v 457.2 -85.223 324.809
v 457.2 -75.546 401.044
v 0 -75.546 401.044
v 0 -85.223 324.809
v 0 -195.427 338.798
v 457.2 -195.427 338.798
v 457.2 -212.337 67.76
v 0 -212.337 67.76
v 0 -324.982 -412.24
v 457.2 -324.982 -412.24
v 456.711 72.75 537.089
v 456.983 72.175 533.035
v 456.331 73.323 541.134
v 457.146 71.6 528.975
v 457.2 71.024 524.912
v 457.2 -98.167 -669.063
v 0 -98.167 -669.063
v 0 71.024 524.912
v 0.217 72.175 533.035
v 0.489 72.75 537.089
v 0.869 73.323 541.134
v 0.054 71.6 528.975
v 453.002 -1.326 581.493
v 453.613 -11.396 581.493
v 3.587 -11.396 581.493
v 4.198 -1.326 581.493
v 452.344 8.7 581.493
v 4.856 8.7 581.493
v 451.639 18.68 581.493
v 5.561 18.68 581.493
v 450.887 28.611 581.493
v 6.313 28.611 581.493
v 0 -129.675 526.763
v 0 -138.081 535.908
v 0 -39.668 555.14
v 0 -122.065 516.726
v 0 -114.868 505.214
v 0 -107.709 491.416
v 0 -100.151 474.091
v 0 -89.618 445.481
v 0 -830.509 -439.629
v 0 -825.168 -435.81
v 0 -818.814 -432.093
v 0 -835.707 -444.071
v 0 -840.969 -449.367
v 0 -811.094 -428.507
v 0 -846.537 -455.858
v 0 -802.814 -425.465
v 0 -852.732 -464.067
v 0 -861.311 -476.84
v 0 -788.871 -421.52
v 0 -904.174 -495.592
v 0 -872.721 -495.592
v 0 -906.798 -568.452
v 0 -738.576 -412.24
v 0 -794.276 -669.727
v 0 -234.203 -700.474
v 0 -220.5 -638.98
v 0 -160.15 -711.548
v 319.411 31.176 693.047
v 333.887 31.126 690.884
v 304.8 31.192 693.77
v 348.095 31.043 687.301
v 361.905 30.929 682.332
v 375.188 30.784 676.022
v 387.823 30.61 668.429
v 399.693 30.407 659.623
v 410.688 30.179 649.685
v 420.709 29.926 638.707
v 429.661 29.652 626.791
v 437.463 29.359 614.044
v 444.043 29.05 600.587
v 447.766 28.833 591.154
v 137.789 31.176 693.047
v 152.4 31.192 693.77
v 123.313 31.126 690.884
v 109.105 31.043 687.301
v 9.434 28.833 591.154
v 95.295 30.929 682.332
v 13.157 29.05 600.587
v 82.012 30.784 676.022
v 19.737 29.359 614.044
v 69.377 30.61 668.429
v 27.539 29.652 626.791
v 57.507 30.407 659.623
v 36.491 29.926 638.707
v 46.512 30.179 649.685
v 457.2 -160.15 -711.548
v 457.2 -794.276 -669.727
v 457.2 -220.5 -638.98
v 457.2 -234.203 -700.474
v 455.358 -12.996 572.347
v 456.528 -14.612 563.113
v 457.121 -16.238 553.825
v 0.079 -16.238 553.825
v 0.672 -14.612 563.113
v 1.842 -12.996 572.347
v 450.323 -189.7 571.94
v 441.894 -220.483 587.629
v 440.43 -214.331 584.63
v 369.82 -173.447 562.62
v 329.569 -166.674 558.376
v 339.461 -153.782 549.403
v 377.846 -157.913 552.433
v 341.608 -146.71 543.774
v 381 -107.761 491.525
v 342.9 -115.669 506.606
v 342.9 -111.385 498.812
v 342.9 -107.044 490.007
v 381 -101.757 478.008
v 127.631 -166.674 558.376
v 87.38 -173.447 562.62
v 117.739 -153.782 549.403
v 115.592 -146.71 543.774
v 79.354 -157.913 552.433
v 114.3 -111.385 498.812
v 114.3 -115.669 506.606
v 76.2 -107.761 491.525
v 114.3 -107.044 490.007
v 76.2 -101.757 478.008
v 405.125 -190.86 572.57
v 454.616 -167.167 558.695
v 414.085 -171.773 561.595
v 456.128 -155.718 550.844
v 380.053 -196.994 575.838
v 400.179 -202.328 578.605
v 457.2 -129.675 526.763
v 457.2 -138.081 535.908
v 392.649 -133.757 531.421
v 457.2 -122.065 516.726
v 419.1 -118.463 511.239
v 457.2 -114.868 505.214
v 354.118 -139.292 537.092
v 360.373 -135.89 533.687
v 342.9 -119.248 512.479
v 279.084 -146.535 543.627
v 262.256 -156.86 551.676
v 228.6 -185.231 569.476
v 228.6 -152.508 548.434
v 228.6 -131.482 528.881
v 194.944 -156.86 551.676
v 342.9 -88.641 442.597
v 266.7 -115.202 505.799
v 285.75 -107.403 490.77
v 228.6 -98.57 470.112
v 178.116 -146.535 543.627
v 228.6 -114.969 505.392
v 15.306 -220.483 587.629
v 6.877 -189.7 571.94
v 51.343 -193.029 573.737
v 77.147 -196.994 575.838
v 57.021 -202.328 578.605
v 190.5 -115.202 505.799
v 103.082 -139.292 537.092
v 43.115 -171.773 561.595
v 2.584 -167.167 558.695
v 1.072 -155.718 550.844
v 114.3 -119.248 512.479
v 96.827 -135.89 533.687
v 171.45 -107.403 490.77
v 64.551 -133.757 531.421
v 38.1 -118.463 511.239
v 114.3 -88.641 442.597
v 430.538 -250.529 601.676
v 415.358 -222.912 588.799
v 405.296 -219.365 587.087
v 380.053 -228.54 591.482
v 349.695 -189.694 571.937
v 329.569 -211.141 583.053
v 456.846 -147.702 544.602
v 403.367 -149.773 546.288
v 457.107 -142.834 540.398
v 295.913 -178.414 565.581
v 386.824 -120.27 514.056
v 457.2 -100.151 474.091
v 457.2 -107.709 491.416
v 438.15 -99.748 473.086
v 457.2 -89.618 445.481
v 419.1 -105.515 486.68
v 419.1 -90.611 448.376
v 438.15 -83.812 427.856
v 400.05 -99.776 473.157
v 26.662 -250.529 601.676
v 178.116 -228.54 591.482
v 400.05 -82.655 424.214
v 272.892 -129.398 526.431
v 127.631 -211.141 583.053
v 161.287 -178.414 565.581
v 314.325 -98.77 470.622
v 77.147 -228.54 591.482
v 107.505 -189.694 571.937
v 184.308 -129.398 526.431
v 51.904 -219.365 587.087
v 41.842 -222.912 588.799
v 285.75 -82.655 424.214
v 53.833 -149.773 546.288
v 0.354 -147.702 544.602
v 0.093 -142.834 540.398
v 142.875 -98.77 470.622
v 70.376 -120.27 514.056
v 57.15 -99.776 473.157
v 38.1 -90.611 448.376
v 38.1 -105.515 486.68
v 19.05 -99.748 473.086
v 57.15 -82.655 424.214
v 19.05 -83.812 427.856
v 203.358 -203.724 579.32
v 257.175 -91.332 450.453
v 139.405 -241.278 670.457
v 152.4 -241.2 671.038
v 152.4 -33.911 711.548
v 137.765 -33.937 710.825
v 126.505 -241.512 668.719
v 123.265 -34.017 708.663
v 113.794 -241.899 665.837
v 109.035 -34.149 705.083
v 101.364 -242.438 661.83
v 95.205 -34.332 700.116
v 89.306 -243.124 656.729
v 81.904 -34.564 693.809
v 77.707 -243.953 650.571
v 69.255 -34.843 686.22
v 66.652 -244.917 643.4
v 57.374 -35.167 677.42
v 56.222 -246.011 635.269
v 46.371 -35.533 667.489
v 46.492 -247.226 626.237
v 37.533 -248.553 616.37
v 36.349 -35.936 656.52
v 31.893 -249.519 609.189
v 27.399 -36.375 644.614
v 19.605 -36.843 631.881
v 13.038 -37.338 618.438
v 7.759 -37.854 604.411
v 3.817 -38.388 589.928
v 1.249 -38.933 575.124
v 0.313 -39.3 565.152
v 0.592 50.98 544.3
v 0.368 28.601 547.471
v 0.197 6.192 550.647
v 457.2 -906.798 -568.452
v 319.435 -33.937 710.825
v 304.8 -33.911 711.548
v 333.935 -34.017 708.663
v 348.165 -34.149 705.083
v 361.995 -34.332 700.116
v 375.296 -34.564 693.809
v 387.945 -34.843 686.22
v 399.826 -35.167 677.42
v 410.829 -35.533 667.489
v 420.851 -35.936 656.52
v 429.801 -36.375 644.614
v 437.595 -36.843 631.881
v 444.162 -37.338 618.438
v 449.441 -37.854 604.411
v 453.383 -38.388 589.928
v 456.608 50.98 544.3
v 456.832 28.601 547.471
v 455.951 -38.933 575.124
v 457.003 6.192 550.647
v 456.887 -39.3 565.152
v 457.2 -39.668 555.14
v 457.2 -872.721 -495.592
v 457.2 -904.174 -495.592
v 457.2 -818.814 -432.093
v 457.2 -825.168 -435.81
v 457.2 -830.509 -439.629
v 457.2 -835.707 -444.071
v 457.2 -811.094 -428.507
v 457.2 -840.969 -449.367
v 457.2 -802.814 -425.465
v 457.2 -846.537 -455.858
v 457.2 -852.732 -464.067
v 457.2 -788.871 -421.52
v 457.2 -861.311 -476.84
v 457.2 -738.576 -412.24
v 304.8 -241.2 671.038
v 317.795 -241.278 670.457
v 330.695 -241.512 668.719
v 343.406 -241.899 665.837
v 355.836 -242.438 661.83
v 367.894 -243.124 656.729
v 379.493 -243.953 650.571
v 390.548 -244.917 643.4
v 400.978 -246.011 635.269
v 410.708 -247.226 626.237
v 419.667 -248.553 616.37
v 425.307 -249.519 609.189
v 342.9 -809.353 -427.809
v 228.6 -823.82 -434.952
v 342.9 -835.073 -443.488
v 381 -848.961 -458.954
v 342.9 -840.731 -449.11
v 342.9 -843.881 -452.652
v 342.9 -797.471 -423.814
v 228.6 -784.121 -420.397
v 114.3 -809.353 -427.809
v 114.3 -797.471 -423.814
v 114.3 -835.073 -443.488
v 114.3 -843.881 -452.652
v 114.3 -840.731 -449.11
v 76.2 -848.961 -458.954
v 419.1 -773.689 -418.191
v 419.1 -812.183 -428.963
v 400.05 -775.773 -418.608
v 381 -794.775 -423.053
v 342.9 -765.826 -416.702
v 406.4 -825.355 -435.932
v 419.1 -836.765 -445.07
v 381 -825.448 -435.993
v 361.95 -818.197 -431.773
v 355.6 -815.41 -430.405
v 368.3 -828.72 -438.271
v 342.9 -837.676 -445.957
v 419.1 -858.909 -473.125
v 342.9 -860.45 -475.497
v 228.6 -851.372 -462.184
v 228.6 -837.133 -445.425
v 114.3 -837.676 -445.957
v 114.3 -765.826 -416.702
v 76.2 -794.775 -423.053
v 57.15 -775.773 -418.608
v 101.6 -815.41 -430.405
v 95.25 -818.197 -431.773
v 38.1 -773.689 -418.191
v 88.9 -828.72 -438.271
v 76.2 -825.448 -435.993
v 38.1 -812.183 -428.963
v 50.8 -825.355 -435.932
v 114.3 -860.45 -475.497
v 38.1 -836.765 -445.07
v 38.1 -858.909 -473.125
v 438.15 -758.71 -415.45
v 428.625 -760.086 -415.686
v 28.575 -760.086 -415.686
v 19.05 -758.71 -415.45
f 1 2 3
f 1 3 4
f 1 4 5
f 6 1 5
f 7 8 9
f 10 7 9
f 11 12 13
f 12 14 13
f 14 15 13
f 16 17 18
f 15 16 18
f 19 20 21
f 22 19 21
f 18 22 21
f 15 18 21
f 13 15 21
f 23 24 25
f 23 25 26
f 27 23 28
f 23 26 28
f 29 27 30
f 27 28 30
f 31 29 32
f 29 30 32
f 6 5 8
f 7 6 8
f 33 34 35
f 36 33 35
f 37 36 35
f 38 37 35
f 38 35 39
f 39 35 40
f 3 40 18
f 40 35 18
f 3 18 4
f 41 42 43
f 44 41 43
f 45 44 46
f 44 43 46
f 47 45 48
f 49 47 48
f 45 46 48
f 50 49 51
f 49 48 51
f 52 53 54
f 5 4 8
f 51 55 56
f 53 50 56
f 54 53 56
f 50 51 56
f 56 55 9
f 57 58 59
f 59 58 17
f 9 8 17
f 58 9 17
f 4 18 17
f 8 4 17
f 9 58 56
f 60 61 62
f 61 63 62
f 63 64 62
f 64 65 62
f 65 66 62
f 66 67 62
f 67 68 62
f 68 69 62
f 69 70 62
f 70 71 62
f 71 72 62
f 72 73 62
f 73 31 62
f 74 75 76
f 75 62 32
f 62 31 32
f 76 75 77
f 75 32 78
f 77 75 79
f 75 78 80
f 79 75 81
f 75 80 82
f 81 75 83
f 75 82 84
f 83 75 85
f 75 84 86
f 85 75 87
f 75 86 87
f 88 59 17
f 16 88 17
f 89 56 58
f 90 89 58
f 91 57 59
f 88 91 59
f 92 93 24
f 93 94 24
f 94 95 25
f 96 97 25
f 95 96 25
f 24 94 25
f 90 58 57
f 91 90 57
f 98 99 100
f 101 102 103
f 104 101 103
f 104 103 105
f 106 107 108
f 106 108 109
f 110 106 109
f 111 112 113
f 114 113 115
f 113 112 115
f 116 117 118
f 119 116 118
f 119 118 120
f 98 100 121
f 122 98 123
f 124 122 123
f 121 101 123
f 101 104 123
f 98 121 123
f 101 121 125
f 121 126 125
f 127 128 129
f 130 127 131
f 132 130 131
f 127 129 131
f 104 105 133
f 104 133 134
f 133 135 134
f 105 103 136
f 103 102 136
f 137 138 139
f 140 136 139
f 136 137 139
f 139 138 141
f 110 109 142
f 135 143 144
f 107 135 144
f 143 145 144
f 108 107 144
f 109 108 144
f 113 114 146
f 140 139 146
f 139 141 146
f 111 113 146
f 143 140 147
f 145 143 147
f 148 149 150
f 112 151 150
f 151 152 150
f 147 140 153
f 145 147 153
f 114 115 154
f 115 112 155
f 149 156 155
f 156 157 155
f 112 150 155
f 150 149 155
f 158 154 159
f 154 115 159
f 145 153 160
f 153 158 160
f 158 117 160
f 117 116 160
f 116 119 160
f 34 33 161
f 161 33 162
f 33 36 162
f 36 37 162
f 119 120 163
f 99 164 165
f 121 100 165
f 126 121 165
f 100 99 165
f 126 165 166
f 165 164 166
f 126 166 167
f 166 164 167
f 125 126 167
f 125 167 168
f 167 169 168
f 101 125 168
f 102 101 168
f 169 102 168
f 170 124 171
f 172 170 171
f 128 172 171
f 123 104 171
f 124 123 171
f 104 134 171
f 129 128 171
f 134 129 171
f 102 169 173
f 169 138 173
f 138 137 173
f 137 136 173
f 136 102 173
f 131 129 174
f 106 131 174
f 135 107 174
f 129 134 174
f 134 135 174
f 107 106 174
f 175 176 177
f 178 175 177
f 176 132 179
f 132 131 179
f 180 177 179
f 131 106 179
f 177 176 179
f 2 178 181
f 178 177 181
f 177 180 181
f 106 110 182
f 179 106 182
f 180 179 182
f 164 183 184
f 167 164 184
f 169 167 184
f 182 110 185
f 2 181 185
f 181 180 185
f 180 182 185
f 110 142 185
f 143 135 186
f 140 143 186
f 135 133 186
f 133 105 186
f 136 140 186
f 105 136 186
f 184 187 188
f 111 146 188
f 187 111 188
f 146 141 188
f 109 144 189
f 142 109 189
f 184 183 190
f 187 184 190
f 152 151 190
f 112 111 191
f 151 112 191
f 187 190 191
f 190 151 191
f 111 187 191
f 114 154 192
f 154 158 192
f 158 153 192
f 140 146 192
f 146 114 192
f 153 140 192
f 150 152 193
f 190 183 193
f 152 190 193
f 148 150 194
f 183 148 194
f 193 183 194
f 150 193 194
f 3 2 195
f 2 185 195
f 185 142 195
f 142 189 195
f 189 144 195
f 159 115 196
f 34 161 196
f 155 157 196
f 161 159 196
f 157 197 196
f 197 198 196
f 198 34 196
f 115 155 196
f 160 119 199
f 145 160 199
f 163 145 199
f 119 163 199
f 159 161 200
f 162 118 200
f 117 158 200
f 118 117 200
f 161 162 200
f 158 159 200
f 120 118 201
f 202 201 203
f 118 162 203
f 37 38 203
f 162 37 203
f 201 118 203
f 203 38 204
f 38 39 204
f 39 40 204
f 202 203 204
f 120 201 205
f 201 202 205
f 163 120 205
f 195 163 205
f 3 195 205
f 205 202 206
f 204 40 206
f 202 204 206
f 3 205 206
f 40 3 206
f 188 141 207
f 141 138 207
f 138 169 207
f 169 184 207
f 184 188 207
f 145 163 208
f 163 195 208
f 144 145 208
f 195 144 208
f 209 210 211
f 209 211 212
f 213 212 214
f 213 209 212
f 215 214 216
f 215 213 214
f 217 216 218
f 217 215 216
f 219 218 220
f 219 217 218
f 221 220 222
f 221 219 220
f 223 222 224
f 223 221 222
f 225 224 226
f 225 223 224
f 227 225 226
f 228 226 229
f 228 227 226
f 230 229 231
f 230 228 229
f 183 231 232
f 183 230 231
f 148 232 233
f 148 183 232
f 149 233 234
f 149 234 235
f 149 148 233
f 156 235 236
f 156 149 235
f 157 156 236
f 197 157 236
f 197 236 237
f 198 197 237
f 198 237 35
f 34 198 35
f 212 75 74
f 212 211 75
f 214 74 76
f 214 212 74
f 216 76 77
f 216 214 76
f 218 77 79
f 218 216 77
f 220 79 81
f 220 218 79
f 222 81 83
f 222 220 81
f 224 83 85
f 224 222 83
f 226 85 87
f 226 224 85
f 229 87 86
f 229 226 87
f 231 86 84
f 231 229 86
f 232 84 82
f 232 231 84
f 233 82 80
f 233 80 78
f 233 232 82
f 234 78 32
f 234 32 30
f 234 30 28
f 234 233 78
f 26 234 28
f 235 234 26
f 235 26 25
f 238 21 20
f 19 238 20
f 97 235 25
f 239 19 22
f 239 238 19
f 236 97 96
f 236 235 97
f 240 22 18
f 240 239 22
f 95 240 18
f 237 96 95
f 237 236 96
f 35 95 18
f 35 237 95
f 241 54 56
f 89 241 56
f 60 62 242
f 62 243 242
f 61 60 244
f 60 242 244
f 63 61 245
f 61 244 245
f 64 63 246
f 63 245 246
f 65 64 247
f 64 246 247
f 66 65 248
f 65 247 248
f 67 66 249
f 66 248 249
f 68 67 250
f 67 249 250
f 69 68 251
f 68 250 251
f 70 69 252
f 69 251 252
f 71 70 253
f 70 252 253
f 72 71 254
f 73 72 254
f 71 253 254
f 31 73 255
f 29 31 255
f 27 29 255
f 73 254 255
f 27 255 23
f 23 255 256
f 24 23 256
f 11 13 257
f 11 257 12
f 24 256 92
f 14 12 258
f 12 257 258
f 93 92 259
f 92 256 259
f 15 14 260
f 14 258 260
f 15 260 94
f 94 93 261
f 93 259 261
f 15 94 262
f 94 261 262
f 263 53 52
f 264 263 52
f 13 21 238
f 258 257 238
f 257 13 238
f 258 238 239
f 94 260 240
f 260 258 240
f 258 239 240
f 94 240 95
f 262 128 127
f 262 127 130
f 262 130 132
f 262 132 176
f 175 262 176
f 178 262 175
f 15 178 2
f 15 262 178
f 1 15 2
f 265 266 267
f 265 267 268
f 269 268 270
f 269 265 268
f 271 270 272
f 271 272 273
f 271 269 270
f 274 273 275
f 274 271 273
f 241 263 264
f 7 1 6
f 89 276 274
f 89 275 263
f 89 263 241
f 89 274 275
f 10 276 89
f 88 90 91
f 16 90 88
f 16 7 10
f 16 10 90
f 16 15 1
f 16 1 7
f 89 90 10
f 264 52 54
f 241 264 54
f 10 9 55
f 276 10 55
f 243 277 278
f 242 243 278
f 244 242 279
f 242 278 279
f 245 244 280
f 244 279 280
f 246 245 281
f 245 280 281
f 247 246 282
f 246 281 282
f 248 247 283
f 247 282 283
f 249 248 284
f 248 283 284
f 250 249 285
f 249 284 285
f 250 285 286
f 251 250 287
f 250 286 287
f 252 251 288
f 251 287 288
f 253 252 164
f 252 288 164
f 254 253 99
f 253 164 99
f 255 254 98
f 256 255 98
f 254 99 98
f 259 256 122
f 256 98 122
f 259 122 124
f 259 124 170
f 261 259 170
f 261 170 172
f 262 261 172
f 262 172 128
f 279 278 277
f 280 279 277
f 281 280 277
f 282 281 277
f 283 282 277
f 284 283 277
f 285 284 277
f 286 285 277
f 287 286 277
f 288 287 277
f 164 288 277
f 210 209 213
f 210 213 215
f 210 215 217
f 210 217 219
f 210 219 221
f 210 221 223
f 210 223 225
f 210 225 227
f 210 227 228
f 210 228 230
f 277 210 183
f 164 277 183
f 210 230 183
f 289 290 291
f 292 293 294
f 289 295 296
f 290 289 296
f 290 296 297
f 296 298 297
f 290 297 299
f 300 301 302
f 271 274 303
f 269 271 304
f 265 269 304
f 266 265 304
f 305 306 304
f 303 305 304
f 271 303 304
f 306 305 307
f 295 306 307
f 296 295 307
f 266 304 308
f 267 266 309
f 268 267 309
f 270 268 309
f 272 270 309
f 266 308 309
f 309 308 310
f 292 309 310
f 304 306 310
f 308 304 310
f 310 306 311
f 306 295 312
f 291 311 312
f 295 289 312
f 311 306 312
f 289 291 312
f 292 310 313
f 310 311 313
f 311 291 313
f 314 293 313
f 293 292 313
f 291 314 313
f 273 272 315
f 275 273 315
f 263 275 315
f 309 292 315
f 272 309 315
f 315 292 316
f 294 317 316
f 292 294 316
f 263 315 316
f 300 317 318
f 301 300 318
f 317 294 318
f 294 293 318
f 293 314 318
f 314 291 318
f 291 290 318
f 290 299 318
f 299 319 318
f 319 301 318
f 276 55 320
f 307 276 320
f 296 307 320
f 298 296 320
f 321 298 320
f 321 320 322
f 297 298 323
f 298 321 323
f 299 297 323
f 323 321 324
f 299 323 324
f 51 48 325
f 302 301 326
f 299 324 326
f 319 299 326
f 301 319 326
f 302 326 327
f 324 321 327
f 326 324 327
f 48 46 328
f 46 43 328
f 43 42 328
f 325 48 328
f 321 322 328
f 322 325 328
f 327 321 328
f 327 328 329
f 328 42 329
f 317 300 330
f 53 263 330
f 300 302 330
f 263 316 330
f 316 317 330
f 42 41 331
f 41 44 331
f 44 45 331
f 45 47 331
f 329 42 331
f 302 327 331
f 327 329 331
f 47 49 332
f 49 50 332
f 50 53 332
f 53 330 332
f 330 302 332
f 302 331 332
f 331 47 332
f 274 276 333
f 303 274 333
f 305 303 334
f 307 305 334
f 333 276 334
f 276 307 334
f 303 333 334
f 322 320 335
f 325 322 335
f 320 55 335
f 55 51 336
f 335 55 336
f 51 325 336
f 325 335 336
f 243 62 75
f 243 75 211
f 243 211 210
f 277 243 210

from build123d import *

# Parameters (mm, degrees)
BOSS_EXTRUDE1_DEPTH = 457.2
FILLET1_R           = 152.4


with BuildPart() as part:
    # Sketch1 → Boss-Extrude1 (new body)
    with BuildSketch(Plane(origin=(0, 0, 0), x_dir=(0, 0, -1), z_dir=(1, 0, 0))):
        with BuildLine():
            Line((711.548200753, -160.15002575), (669.063267675, -98.166541557))
            Line((669.063267675, -98.166541557), (-541.133997798, 73.322803393))
            Line((-541.133997798, 73.322803393), (-553.825031188, -16.23759413))
            Line((-553.825031188, -16.23759413), (-581.492567074, -11.395775351))
            Line((-581.492567074, -11.395775351), (-581.492567074, 28.611066701))
            Line((-581.492567074, 28.611066701), (-693.769833475, 31.192153284))
            Line((-693.769833475, 31.192153284), (-711.548200753, -33.910775567))
            Line((-711.548200753, -33.910775567), (-671.038221505, -241.199727441))
            Line((-671.038221505, -241.199727441), (-601.675855782, -250.529122735))
            add(Edge.make_bspline(
                [(-601.675855782, -250.529122735), (-541.133997798, -117.43304901), (-401.043539171, -75.545762029)],
                knots=[0, 0, 0, 1, 1, 1], degree=2, weights=[1, 2.246019703, 1]))
            Line((-401.043539171, -75.545762029), (-324.808759835, -85.222901727))
            Line((-324.808759835, -85.222901727), (-338.797926094, -195.427056695))
            Line((-338.797926094, -195.427056695), (-67.759534981, -212.336640741))
            Line((-67.759534981, -212.336640741), (412.240396354, -324.981912238))
            Line((412.240396354, -324.981912238), (412.240396354, -738.576379205))
            add(Edge.make_bspline(
                [(412.240396354, -738.576379205), (426.282298959, -832.127735112), (495.591928337, -872.720699723)],
                knots=[0, 0, 0, 1, 1, 1], degree=2, weights=[1, 2.18722751, 1]))
            Line((495.591928337, -872.720699723), (495.591928337, -904.174333001))
            Line((495.591928337, -904.174333001), (568.451677177, -906.798188592))
            Line((568.451677177, -906.798188592), (669.726727221, -794.275861448))
            Line((669.726727221, -794.275861448), (638.979909752, -220.499963189))
            Line((638.979909752, -220.499963189), (700.473544691, -234.202580835))
            Line((700.473544691, -234.202580835), (711.548200753, -160.15002575))
        make_face()
    extrude(amount=BOSS_EXTRUDE1_DEPTH)

    # Fillet1
    fillet1_edges = [part.edges().sort_by_distance(p)[0] for p in [
        (0, -137.555251504, 691.293211129),
        (0, -1.359311141, 702.659017114),
        (457.2, -137.555251504, 691.293211129),
        (457.2, -1.359311141, 702.659017114),
    ]]
    fillet(fillet1_edges, radius=FILLET1_R)


solid = part.part
